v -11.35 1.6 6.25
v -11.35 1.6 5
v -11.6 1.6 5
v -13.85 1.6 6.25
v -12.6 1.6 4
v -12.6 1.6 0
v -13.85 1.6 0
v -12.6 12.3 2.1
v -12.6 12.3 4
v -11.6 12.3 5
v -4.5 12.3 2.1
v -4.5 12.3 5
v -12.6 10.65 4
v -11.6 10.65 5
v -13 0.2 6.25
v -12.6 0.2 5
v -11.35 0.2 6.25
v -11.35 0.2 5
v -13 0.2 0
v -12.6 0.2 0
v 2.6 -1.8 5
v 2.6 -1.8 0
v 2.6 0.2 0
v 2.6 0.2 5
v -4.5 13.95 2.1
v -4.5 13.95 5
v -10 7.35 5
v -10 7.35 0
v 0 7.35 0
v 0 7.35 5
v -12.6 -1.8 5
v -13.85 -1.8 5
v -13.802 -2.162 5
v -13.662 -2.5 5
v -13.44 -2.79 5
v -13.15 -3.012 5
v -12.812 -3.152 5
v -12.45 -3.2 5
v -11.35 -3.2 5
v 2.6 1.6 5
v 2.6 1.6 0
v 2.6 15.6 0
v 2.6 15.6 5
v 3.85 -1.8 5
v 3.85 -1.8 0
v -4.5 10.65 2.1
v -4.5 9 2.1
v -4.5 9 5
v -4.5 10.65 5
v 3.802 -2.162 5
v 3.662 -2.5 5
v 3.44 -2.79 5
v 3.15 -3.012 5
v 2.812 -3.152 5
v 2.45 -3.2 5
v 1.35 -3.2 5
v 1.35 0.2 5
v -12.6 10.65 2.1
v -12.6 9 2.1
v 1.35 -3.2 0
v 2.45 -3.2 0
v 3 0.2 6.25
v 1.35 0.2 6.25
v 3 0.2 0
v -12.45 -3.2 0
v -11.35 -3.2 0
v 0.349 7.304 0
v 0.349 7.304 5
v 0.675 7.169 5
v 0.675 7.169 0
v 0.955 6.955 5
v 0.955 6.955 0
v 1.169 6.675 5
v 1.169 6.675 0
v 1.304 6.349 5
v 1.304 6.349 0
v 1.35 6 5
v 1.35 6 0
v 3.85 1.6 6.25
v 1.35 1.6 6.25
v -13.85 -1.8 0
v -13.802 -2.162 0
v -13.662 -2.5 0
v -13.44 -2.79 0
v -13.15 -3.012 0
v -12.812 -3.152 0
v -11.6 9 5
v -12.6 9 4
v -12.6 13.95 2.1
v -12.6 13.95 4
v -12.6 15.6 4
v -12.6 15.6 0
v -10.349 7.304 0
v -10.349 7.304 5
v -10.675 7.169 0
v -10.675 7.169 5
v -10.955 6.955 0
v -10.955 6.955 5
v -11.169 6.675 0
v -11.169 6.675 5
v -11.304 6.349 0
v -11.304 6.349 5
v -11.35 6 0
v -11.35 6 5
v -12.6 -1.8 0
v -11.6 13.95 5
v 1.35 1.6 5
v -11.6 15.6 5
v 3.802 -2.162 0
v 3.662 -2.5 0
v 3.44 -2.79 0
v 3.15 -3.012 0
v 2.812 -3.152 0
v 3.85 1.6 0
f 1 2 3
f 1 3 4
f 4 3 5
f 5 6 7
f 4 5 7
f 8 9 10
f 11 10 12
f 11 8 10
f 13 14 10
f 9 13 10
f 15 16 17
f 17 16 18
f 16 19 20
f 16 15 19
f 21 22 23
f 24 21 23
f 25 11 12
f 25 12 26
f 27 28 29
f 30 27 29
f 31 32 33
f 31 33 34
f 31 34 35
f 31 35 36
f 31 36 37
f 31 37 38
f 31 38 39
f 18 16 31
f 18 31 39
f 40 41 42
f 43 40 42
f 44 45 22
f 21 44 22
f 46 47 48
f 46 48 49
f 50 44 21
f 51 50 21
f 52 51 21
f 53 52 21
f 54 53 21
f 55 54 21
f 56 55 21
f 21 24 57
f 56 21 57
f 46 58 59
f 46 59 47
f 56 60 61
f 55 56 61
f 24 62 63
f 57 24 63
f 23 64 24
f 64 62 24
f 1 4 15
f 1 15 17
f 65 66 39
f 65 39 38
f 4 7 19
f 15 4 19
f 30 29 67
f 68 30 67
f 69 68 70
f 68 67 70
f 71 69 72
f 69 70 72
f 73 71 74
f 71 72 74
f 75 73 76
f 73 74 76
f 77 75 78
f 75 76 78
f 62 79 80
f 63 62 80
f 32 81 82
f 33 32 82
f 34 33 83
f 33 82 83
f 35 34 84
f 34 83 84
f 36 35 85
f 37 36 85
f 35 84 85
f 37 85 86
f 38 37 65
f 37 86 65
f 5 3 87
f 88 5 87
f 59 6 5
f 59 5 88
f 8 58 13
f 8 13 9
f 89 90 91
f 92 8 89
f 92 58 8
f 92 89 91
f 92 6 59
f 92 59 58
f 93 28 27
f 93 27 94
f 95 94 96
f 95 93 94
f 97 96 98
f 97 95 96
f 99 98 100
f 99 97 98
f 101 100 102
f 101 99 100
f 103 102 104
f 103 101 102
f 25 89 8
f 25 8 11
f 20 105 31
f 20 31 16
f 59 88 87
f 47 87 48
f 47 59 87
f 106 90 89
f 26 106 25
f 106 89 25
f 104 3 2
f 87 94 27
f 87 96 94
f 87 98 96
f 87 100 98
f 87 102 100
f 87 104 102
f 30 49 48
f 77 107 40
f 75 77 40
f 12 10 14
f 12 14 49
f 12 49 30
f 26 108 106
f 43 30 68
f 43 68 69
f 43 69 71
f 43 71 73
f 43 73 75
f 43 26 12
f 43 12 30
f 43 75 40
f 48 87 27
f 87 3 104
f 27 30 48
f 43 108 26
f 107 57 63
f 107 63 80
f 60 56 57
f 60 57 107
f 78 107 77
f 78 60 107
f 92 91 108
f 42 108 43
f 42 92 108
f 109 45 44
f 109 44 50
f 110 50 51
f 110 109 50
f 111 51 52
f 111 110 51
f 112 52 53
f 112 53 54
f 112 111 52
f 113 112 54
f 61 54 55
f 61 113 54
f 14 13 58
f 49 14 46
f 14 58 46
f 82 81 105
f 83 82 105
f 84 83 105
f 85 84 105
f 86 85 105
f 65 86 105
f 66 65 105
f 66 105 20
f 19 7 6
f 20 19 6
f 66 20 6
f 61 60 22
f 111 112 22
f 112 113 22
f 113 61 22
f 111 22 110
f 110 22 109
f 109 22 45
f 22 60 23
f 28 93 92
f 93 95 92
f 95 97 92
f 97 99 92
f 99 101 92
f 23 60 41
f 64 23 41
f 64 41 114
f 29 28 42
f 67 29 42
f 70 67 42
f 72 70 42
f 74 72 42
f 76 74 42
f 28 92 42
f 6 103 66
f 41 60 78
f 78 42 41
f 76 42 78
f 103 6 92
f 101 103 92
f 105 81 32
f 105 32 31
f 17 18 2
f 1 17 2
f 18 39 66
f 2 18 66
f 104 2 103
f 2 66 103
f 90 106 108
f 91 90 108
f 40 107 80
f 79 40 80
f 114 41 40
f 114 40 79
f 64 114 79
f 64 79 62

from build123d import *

# Parameters (mm, degrees)
PAD017_DEPTH           = 5
PAD020_DEPTH           = 6.25
SKETCH038_W            = 10
SKETCH038_H            = 1.65
PAD021_DEPTH           = 5
SKETCH079_W            = 15.2
SKETCH079_H            = 1.65
PAD051_DEPTH           = 2.1
SKETCH080_W            = 7.1
SKETCH080_H            = 1.65
PAD052_DEPTH           = 5
SKETCH081_W            = 15.2
SKETCH081_H            = 1.65
PAD053_DEPTH           = 5
LINEARPATTERN018_COUNT = 2
LINEARPATTERN018_PITCH = 3.3
CHAMFER008_SIZE        = 1


with BuildPart() as bc_c:
    # Sketch034 → Pad017 (new body)
    with BuildSketch(Plane.XY):
        with BuildLine():
            Line((-1.35, -1.8), (-1.35, 6))
            ThreePointArc((0, 7.35), (-0.954594, 6.954594), (-1.35, 6))
            Line((0, 9), (0, 7.35))
            Line((-2.6, 9), (0, 9))
            Line((-2.6, -1.8), (-2.6, 9))
            Line((-3.85, -1.8), (-2.6, -1.8))
            ThreePointArc((-3.85, -1.8), (-3.439949, -2.789949), (-2.45, -3.2))
            Line((-1.35, -3.2), (-2.45, -3.2))
            Line((-1.35, -1.8), (-1.35, -3.2))
        make_face()
    extrude(amount=PAD017_DEPTH)

    # Sketch037 → Pad020 (join)
    with BuildSketch(Plane.XY):
        Polygon((-1.35, 0.2), (-1.35, 1.6), (-2.6, 1.6), (-3.85, 1.6), (-3, 0.2), (-2.6, 0.2), align=None)
    extrude(amount=PAD020_DEPTH)


with BuildPart() as body028:
    # Mirror002: instance of _bc_c
    add(bc_c.part.mirror(Plane(origin=(5, 0, 0), x_dir=(0, 1, 0), z_dir=(-1, 0, 0))))

    # Fusion002: union _bc_c
    add(bc_c.part)


with BuildPart() as body028_1:
    # Clone003 placement: moved
    add(body028.part.moved(Location((-5, 0, 0))))

    # Sketch038 → Pad021 (new body)
    with BuildSketch(Plane.XY):
        with Locations((0, 8.175)):
            Rectangle(SKETCH038_W, SKETCH038_H)
    extrude(amount=PAD021_DEPTH)

    # Sketch079 → Pad051 (new body)
    with BuildSketch(Plane.XY):
        with Locations((0, 9.825)):
            Rectangle(SKETCH079_W, SKETCH079_H)
    pad051 = extrude(amount=PAD051_DEPTH)

    # Sketch080 → Pad052 (join)
    with BuildSketch(Plane.XY):
        with Locations((4.05, 9.825)):
            Rectangle(SKETCH080_W, SKETCH080_H)
    pad052 = extrude(amount=PAD052_DEPTH)

    # Sketch081 → Pad053 (join)
    with BuildSketch(Plane.XY):
        with Locations((0, 11.475)):
            Rectangle(SKETCH081_W, SKETCH081_H)
    pad053 = extrude(amount=PAD053_DEPTH)

    # LinearPattern018: Pad053, Pad052, Pad051 ×2
    with Locations(*[(0, i * LINEARPATTERN018_PITCH, 0) for i in range(1, LINEARPATTERN018_COUNT)]):
        add(pad053)
        add(pad052)
        add(pad051)

    # Chamfer008
    chamfer008_edges = [body028_1.edges().sort_by_distance(p)[0] for p in [
        (-7.6, 5.3, 5),
        (-7.6, 11.475, 5),
        (-7.6, 14.775, 5),
    ]]
    chamfer(chamfer008_edges, length=CHAMFER008_SIZE)


with BuildPart() as body028_2:
    # Body028 placement: moved
    add(body028_1.part.moved(Location((-5, 0, 0))))


solid = body028_2.part
